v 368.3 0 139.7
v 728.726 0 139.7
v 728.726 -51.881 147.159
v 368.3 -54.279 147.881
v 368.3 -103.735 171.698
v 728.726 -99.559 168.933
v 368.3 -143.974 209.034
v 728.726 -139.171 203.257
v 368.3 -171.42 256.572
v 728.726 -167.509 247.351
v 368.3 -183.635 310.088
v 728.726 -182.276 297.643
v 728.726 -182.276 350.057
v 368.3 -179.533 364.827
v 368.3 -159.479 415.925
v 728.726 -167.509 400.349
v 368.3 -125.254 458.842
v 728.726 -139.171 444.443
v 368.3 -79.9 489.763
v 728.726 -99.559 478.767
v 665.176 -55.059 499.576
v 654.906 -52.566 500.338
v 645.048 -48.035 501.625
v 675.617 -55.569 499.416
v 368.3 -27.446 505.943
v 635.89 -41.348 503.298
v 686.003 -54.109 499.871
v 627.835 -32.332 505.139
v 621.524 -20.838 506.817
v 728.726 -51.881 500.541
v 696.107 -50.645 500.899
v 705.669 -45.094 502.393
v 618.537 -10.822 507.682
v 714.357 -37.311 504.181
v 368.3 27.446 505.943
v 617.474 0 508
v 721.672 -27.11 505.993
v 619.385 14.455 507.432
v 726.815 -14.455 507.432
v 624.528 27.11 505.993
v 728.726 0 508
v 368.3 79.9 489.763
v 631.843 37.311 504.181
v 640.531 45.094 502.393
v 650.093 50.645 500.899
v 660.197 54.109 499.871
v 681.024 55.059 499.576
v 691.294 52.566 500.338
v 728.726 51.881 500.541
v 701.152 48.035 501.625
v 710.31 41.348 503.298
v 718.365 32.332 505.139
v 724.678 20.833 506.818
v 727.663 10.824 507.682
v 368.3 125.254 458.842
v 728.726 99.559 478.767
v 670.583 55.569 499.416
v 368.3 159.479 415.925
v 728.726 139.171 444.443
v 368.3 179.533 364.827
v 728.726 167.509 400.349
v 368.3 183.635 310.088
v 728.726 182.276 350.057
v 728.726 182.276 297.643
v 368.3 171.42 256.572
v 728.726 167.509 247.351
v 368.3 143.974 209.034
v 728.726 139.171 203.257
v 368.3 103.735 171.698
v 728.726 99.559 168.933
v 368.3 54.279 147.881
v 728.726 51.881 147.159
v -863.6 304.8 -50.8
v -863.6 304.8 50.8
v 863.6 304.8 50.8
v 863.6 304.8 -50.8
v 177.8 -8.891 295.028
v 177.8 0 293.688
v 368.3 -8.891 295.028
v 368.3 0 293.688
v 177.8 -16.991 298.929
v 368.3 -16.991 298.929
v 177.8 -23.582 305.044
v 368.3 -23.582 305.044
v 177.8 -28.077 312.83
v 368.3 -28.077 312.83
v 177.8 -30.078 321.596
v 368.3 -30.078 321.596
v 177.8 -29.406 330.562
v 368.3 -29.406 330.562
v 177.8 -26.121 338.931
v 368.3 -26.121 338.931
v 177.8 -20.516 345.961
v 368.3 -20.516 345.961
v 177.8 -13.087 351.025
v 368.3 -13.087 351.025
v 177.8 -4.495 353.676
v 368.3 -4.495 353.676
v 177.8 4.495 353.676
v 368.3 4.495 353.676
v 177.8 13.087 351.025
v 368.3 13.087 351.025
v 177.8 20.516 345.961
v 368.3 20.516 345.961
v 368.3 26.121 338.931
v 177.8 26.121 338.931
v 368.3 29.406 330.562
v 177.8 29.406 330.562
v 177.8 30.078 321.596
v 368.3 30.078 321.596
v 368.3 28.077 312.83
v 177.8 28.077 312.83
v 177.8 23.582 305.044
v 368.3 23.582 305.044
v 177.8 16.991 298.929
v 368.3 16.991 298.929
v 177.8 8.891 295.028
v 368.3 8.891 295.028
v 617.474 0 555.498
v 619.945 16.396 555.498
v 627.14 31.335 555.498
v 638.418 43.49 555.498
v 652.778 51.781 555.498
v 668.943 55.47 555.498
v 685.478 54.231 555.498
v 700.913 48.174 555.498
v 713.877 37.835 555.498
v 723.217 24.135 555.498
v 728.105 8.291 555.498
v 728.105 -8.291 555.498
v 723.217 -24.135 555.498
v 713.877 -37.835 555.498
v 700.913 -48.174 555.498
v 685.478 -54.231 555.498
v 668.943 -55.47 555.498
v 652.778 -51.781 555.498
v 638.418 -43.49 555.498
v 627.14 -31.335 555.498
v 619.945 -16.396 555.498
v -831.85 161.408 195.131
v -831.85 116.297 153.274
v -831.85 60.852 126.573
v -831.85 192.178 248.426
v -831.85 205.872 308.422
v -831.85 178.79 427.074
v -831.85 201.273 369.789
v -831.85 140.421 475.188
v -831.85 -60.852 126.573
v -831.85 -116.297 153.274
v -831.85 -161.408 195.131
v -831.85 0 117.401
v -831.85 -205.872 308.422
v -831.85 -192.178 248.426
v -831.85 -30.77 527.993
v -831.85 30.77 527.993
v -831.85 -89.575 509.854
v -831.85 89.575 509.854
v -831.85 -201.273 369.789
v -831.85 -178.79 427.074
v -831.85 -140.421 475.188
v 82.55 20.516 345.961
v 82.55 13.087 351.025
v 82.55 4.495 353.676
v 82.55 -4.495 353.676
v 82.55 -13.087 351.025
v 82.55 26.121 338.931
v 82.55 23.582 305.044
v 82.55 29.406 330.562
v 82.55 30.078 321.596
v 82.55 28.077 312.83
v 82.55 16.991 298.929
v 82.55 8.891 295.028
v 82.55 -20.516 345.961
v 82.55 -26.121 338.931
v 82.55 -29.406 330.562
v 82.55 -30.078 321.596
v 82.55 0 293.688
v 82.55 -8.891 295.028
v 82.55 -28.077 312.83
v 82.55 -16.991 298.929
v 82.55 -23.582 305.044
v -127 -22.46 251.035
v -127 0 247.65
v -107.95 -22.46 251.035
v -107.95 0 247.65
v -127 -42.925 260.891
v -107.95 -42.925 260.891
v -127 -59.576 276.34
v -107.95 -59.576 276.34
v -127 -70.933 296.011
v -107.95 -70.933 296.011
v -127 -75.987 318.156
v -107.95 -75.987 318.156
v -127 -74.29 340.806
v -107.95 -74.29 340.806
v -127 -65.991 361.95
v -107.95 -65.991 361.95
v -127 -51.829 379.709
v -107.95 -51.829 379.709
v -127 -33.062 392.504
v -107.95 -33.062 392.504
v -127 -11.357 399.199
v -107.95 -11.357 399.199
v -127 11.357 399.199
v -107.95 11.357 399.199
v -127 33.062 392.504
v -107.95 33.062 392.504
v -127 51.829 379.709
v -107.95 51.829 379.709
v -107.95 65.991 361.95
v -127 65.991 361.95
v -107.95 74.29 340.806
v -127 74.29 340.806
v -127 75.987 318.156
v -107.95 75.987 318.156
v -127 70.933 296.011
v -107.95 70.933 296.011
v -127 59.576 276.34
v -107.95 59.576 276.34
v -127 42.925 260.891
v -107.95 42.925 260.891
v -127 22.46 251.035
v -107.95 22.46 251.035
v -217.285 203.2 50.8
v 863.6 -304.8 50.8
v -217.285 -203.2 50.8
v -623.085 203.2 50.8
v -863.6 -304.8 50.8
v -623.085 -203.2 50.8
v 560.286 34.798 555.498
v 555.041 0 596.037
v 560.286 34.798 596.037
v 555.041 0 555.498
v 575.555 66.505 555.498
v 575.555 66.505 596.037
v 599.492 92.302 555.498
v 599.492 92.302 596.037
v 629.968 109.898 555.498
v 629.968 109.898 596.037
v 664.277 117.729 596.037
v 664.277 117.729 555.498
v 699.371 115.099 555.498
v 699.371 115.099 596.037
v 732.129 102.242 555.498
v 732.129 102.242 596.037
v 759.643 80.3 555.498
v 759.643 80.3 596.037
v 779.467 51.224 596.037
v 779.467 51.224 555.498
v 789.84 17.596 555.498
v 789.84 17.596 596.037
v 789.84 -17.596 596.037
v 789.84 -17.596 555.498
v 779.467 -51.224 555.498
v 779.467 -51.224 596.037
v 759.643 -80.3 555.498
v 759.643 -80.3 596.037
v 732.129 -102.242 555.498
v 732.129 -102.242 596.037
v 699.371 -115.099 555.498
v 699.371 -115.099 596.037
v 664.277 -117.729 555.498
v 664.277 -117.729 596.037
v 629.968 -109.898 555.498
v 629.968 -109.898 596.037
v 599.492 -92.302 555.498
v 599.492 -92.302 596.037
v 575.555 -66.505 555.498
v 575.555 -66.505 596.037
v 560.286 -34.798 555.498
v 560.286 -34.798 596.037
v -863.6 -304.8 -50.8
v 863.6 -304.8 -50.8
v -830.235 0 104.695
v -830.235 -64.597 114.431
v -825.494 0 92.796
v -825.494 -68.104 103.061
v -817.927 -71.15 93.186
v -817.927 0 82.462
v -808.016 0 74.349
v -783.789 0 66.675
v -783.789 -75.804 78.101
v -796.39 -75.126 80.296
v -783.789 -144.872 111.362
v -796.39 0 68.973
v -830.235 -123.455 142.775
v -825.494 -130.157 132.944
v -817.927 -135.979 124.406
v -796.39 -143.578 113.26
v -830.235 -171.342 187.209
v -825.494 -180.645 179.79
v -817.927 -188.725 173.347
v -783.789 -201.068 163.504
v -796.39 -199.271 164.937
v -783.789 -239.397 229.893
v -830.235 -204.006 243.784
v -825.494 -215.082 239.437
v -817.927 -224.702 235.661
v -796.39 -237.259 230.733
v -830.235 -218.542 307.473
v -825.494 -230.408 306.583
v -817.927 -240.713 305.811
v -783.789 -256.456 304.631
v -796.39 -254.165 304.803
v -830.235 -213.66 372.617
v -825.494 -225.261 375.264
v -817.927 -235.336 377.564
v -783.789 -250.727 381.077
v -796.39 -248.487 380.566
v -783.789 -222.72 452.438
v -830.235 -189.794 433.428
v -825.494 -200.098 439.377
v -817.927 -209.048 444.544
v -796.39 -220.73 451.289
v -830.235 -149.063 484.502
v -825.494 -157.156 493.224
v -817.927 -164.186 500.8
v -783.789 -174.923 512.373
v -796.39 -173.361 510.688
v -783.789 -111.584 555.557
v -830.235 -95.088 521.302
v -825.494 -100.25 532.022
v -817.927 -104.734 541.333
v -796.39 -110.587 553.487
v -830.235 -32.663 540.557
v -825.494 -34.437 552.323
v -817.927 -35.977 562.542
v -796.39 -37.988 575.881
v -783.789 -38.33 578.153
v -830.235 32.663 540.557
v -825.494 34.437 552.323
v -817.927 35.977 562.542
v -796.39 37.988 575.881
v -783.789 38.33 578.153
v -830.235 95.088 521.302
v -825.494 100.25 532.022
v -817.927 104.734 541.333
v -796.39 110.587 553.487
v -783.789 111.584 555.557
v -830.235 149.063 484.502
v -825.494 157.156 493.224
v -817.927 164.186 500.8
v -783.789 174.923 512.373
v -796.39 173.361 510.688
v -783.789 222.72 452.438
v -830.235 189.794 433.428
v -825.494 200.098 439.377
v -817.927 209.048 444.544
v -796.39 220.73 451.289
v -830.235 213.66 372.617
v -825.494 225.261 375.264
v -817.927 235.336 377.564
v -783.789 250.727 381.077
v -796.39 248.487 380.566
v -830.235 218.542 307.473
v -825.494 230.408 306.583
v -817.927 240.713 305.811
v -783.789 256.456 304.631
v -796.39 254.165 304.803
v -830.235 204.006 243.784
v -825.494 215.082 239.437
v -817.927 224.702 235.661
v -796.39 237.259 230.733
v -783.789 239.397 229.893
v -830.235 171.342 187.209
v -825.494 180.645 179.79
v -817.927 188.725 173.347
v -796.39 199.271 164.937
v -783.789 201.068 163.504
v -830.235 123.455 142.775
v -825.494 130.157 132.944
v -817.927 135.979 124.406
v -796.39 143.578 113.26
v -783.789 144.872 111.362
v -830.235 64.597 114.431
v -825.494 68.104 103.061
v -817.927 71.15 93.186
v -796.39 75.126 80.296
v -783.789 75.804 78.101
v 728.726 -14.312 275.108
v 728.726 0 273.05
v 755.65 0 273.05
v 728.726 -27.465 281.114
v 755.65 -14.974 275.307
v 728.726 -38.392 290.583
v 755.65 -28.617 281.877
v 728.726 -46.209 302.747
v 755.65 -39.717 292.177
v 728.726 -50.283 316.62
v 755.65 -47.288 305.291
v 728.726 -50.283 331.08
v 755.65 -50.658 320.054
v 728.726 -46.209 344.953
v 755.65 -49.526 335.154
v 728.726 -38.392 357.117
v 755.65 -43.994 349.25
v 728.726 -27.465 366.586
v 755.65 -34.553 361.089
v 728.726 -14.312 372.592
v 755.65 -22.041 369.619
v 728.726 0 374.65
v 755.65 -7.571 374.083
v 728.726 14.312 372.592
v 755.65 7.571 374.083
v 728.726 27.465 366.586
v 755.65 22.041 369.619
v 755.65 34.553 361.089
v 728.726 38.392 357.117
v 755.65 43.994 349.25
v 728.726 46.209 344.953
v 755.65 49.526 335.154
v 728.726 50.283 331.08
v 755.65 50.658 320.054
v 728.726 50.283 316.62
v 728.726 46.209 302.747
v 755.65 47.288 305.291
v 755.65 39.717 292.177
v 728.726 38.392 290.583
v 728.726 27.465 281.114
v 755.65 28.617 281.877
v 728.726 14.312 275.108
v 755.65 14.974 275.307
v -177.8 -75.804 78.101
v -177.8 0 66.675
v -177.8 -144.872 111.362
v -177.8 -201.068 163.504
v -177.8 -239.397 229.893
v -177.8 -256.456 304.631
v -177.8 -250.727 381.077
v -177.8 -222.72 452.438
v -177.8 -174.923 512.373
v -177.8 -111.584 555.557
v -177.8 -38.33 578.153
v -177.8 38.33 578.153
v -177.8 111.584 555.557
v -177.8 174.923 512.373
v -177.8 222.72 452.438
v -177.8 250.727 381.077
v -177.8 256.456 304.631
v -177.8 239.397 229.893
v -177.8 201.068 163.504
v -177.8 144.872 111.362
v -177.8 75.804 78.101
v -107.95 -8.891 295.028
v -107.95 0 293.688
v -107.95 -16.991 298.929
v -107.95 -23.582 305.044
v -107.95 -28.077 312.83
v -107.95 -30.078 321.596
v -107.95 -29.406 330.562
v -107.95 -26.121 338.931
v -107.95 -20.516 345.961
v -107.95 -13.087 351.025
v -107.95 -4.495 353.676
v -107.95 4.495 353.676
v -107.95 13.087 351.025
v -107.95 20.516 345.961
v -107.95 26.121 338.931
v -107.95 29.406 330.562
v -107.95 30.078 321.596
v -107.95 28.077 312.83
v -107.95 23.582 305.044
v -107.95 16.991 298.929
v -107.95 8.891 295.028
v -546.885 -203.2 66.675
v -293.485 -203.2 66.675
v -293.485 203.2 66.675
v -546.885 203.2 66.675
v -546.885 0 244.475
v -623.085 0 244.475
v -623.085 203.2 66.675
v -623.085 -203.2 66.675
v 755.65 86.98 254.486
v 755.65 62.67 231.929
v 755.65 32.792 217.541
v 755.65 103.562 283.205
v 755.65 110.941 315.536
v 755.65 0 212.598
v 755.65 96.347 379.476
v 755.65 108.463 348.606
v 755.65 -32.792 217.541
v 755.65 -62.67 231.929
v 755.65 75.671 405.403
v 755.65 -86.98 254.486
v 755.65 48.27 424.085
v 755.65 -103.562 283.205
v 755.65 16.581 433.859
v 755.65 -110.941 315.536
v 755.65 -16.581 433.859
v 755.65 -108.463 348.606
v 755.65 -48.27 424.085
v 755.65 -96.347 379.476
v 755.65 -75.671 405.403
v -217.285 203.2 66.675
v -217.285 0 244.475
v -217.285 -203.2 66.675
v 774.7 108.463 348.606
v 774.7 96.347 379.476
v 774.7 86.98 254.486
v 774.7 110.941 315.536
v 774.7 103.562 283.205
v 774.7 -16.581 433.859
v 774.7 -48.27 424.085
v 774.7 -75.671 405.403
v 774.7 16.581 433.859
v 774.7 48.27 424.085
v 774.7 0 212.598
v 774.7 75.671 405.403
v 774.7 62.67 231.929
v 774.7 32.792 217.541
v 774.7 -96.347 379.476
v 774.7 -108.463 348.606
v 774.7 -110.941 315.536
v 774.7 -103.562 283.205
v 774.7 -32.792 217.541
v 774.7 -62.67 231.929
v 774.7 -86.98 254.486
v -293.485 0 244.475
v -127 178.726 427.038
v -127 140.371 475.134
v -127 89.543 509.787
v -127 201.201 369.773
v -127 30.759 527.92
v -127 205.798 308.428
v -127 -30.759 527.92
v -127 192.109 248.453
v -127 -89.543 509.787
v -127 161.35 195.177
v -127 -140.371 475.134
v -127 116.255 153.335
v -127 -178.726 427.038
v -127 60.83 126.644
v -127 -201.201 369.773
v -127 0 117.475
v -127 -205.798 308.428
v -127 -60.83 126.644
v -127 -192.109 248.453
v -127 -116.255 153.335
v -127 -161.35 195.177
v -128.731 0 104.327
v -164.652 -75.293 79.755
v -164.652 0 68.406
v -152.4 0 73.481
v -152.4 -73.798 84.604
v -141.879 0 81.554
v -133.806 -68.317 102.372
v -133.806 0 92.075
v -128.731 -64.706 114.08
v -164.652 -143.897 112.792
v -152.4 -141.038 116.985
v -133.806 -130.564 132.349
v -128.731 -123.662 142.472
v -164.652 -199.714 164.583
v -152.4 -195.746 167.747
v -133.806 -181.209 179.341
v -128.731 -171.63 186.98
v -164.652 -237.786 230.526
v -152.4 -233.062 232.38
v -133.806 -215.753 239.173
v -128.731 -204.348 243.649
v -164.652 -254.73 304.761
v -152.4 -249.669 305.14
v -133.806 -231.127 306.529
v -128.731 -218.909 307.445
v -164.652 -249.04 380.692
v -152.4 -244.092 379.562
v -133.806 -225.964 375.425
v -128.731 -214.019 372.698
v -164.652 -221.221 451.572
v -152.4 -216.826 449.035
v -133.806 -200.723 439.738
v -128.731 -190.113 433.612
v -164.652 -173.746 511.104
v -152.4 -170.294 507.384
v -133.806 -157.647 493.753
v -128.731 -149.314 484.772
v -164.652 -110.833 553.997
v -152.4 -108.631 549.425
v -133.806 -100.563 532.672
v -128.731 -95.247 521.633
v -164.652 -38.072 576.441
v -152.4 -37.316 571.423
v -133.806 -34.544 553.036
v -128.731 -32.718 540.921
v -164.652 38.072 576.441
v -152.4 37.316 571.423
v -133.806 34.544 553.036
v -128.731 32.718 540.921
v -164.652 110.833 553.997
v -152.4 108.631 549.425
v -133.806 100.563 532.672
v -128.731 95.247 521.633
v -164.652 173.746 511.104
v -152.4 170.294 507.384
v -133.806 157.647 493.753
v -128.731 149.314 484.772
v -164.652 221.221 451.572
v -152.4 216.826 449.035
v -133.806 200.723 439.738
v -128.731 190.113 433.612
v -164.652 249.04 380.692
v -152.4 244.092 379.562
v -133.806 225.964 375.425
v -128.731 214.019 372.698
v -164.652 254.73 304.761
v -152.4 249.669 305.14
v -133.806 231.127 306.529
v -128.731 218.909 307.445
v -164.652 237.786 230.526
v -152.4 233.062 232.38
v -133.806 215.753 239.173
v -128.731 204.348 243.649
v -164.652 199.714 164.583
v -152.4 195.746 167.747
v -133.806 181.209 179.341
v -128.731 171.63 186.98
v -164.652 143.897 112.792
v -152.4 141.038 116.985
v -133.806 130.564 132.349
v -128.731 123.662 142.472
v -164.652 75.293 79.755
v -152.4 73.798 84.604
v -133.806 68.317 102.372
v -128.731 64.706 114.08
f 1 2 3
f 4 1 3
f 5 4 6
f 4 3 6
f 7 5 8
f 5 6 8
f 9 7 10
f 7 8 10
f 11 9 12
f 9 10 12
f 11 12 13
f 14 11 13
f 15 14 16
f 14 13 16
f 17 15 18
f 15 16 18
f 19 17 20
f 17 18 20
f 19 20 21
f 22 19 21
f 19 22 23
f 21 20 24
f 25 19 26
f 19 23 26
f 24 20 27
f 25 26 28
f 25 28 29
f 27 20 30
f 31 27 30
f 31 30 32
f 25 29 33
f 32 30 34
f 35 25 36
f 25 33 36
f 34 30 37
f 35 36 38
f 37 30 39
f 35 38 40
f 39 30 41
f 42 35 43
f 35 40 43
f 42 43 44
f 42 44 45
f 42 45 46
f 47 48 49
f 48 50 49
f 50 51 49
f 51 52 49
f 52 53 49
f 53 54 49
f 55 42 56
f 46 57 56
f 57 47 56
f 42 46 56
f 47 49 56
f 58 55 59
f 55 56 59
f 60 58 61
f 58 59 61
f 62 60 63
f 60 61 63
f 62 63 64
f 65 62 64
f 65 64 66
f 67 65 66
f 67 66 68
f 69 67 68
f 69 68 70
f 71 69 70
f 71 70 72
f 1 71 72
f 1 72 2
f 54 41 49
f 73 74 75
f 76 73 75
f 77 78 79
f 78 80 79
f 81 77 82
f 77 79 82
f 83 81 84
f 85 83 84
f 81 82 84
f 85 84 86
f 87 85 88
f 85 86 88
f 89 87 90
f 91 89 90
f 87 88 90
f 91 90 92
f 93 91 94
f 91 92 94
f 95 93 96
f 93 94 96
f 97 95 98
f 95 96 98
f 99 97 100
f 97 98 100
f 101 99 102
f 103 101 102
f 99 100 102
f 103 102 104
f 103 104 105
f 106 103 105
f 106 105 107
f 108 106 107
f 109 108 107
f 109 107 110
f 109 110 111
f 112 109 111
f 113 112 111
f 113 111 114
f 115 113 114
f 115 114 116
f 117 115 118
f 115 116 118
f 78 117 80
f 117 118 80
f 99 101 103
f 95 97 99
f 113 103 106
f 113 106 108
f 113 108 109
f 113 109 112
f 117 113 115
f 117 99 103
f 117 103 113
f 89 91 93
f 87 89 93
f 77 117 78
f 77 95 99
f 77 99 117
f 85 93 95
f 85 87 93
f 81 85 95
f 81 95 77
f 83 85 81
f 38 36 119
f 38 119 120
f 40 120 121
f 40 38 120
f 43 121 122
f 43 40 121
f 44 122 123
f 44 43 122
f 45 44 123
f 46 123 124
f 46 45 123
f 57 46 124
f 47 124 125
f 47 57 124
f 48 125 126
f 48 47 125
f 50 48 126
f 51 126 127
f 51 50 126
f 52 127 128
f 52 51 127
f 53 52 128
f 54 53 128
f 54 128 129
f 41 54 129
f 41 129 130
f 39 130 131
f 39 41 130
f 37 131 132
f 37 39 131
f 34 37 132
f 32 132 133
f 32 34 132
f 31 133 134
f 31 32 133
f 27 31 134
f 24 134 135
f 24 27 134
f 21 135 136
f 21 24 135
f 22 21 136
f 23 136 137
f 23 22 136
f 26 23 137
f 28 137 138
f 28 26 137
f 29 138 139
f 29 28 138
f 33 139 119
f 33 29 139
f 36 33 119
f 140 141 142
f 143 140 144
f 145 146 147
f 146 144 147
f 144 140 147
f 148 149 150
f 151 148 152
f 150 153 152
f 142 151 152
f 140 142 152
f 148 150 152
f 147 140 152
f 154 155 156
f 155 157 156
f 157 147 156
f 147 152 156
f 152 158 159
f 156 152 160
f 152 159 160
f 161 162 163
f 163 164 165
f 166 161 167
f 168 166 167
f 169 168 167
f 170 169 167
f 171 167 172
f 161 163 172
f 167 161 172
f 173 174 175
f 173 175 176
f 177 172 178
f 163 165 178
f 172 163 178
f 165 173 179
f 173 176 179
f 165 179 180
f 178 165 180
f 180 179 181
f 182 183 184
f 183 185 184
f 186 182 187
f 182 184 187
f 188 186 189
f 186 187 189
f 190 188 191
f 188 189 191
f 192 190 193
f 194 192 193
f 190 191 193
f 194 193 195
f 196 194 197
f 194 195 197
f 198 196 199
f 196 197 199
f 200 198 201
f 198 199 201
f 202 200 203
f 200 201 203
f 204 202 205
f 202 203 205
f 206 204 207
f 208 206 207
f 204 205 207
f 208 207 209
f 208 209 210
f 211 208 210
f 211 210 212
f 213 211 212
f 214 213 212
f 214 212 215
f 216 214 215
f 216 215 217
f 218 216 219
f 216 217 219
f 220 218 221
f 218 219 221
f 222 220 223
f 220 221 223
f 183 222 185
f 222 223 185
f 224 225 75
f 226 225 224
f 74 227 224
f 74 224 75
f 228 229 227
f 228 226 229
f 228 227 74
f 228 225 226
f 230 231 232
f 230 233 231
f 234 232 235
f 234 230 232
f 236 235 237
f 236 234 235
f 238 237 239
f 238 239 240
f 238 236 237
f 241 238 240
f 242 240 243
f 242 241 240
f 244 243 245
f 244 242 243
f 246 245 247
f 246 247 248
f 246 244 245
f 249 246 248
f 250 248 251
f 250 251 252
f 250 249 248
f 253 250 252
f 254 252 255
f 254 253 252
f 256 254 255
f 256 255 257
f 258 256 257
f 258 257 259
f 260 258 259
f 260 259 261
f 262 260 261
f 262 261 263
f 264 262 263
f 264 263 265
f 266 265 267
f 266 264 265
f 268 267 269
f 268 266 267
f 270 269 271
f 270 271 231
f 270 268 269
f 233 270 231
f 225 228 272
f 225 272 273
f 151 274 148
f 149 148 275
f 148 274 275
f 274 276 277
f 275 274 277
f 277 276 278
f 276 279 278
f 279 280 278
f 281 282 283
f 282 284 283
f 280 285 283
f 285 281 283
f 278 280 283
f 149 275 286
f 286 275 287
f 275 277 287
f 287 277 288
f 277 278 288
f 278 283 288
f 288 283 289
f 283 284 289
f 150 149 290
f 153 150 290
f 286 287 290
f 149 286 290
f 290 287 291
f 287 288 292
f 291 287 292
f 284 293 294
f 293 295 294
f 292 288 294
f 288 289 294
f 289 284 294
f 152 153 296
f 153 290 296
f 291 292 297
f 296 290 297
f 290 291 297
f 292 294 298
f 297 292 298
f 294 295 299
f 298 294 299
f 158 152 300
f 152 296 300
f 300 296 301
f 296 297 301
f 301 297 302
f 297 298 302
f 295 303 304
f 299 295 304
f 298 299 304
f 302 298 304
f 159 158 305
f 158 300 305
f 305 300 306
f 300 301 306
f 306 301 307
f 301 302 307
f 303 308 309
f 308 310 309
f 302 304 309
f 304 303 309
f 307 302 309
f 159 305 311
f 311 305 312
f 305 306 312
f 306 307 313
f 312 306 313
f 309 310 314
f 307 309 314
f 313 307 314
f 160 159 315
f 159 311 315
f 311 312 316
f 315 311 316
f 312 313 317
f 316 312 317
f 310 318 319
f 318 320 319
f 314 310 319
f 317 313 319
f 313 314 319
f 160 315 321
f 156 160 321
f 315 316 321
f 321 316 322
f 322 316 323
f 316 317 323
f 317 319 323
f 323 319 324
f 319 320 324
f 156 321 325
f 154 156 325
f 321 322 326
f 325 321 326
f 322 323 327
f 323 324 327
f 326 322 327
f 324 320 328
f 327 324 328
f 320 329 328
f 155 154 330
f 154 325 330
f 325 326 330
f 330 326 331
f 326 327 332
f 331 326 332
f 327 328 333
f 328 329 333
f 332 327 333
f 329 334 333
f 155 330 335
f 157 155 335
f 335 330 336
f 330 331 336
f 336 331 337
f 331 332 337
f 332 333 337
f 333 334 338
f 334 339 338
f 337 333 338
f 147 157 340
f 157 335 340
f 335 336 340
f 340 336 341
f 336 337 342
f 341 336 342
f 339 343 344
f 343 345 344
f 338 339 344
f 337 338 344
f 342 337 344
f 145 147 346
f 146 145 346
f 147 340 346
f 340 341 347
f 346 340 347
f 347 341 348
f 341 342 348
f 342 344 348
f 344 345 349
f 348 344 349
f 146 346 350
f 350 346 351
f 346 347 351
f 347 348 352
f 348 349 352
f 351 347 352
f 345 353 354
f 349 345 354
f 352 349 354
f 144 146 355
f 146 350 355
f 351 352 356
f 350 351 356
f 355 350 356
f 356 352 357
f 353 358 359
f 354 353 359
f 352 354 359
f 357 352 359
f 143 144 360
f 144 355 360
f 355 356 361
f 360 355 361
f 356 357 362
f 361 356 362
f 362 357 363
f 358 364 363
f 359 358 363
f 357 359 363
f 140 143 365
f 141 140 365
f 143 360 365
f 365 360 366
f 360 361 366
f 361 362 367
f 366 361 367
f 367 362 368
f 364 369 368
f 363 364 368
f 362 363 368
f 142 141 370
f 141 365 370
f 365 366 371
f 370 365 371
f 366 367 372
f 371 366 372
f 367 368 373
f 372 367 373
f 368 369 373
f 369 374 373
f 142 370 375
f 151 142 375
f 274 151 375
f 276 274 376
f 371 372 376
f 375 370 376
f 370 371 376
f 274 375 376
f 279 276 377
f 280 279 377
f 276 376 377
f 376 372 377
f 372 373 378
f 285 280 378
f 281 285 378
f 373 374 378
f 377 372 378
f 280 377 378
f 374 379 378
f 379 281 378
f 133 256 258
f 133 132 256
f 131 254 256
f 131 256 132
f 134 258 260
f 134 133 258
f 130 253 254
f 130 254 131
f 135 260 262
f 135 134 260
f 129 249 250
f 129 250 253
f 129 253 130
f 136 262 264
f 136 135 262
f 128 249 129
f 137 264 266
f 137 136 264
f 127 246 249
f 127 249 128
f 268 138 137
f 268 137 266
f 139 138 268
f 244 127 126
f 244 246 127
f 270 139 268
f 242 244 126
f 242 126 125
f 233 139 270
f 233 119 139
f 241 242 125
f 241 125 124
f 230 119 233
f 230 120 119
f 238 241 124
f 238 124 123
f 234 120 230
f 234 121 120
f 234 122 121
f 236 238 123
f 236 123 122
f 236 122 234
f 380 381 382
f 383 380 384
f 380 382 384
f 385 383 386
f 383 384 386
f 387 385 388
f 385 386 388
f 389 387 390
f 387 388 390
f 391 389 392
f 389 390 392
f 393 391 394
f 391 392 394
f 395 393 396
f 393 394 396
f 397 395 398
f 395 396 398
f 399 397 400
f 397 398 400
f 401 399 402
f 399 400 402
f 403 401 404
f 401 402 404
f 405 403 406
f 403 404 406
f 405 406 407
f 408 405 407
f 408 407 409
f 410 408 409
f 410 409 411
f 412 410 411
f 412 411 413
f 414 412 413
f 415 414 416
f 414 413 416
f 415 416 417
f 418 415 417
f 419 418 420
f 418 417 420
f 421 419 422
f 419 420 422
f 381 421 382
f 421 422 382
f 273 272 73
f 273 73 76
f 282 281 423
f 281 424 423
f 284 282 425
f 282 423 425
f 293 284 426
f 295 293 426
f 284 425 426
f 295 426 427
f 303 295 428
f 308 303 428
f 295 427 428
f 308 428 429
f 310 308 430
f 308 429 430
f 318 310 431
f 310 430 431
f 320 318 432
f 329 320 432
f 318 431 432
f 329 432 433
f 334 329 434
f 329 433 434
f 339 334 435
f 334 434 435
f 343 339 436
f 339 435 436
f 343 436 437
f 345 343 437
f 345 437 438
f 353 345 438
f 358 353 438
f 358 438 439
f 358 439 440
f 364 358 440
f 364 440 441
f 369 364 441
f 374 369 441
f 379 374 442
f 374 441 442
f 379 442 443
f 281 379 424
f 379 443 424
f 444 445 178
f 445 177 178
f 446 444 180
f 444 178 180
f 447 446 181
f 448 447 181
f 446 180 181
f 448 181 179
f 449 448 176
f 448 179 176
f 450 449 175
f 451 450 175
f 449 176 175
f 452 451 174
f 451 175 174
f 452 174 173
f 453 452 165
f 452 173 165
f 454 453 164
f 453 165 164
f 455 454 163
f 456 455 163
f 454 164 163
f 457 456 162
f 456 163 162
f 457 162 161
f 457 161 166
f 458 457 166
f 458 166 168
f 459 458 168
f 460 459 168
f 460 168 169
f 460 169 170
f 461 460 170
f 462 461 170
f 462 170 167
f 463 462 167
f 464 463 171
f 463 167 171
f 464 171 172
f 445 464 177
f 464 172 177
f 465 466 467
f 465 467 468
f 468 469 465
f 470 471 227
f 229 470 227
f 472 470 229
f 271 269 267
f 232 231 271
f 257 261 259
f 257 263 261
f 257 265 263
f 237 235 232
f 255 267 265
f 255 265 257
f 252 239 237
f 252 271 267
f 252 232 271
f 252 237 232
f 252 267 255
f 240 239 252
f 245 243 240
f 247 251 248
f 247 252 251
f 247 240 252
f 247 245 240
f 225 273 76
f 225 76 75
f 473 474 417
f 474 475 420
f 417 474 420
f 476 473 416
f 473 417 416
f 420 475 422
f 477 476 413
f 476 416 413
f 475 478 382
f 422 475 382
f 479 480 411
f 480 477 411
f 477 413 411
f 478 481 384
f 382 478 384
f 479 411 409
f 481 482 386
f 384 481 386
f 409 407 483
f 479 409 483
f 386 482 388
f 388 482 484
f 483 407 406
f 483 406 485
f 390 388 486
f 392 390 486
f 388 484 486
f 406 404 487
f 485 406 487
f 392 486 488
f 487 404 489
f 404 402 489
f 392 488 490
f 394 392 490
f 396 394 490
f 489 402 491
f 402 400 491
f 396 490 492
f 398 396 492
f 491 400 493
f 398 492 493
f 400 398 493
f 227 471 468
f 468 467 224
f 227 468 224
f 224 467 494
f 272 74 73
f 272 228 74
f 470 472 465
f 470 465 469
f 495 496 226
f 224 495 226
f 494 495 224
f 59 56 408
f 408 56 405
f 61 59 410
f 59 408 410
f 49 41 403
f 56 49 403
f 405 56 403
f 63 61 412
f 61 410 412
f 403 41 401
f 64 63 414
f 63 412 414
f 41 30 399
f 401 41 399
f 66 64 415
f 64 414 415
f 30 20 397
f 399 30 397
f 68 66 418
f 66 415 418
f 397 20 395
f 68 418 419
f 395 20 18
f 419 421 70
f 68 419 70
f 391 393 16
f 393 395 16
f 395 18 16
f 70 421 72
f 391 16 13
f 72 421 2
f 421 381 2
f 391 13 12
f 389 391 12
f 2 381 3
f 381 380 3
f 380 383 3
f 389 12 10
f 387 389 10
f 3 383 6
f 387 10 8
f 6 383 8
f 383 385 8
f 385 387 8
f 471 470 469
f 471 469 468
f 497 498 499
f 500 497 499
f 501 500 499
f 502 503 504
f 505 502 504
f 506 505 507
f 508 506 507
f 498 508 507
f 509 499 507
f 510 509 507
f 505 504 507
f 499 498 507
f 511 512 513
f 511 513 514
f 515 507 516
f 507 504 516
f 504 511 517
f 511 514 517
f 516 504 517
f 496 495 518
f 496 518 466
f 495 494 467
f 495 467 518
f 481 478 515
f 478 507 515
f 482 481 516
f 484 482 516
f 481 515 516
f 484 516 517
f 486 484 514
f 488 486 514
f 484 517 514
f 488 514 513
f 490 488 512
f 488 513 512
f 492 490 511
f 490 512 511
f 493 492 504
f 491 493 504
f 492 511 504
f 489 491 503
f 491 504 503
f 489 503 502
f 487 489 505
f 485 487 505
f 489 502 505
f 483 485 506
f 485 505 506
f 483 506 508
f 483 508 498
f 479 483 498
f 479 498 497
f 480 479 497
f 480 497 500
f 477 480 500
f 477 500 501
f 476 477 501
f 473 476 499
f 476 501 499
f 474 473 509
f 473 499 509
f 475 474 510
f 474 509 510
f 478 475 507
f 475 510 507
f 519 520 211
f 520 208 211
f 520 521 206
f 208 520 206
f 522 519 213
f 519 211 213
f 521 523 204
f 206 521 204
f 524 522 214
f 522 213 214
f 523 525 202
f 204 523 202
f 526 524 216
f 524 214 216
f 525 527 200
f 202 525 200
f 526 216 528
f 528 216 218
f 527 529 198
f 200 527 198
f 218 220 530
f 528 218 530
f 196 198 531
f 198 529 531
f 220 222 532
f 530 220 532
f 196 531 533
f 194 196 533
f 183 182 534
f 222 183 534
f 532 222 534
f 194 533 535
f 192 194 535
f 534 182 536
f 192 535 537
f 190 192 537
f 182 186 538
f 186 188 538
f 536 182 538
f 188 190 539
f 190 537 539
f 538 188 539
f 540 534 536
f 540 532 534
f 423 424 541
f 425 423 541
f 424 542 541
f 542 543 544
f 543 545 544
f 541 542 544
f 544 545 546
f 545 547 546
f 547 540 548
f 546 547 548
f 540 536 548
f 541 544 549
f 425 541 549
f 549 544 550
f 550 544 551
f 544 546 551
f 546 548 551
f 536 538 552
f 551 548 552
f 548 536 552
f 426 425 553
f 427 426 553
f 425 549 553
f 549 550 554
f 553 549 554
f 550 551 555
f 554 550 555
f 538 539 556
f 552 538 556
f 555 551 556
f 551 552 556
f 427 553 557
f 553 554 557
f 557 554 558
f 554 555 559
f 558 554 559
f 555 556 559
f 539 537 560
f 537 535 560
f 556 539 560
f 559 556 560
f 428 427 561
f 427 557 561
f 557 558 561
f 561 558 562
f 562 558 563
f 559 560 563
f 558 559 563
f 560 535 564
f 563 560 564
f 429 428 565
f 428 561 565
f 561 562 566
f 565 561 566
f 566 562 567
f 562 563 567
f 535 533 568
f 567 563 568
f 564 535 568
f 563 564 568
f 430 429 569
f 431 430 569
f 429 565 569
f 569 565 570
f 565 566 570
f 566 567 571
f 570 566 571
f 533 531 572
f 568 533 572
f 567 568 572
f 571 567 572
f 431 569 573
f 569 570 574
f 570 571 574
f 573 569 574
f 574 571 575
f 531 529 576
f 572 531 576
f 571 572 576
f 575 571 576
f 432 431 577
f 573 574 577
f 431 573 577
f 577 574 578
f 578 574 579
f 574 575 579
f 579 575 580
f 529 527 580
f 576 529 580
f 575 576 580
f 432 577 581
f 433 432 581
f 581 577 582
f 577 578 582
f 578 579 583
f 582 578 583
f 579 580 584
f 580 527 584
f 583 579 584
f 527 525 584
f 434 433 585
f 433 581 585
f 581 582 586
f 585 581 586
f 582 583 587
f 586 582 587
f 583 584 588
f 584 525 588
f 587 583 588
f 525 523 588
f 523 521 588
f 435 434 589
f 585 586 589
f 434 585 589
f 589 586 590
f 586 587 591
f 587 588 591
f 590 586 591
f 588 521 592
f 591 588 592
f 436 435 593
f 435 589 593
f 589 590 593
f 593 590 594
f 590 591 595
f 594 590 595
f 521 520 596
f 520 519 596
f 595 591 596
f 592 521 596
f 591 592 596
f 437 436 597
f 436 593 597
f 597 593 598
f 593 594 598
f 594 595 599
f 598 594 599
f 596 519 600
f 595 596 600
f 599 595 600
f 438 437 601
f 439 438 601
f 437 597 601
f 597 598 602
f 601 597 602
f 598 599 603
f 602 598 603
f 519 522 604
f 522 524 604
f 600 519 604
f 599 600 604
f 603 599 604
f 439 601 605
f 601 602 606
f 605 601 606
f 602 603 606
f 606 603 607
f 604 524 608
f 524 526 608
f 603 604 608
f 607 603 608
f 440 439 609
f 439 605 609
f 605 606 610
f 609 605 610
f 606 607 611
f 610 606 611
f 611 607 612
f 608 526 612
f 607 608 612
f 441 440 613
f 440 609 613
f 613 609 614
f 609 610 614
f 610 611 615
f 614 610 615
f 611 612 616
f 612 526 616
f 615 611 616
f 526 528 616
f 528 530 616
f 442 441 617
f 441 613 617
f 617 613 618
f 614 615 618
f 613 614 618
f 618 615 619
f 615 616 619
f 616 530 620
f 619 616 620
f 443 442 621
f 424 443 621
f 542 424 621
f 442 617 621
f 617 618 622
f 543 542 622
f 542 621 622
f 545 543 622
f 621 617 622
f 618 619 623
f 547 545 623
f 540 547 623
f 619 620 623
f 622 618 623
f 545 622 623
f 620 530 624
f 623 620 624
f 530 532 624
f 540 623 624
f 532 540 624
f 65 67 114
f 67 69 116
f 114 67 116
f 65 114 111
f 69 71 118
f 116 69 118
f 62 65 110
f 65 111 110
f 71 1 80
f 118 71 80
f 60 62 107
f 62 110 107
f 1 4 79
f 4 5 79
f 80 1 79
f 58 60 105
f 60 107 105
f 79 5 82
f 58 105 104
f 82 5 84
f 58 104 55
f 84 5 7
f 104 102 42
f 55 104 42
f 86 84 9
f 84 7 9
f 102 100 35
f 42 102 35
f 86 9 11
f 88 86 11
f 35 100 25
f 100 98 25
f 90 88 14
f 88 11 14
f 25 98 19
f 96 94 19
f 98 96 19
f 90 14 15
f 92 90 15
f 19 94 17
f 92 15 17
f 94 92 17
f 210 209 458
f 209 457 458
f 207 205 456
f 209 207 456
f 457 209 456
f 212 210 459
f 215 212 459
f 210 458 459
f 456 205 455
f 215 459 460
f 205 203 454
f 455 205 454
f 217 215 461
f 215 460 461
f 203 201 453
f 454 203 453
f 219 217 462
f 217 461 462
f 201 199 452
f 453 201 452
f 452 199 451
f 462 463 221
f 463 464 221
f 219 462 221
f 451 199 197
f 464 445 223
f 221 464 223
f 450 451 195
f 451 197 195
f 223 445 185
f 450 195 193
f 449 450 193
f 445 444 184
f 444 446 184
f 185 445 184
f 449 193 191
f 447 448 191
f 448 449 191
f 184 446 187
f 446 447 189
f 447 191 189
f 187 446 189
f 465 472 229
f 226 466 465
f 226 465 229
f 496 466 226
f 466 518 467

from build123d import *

# Parameters (mm, degrees)
F0_W     = 190.5
F0_H     = 30.1625
F2_DEPTH = 203.2
F4_DEPTH = 76.2
F6_DEPTH = 76.2
F7_DEPTH = 304.8
F0_W_2   = 26.924
F0_H_2   = 50.8
F0_W_3   = 55.626
F0_H_3   = 47.498
F0_H_4   = 184.15


with BuildPart() as f1:
    # F0 (on Front) → F1 (revolve)
    with BuildSketch(Plane.XZ):
        with BuildLine():
            ThreePointArc((-831.85, 117.4010858536), (-817.9268261091, 82.4620003458), (-783.7893820427, 66.675))
            Line((-783.7893820427, 66.675), (-623.0849027634, 66.675))
            Line((-623.0849027634, 66.675), (-234.2933673859, 66.675))
            Line((-234.2933673859, 66.675), (-234.2933673859, 323.85))
            Line((-234.2933673859, 323.85), (-831.85, 323.85))
            Line((-831.85, 323.85), (-831.85, 117.4010858536))
        make_face()
        with BuildLine():
            Line((-234.2933673859, 323.85), (-234.2933673859, 66.675))
            Line((-234.2933673859, 66.675), (-217.2845751047, 66.675))
            Line((-217.2845751047, 66.675), (-177.8, 66.675))
            ThreePointArc((-177.8, 66.675), (-141.8789755157, 81.5539755157), (-127, 117.475))
            Line((-127, 117.475), (-127, 247.65))
            Line((-127, 247.65), (-127, 323.85))
            Line((-127, 323.85), (-234.2933673859, 323.85))
        make_face()
        Polygon((-107.95, 323.85), (-127, 323.85), (-127, 247.65), (-107.95, 247.65), (-107.95, 293.6875), align=None)
        with Locations((-12.7, 308.76875)):
            Rectangle(F0_W, F0_H)
    revolve(axis=Axis((-374.65, 0, 323.85), (-1, 0, 0)))


with BuildPart() as f2:
    # F0 (on Front) → F2 (new body, symmetric)
    with BuildSketch(Plane.XZ):
        Polygon((-623.0849027634, 66.675), (-623.0849027634, 50.8), (-533.4, 50.8), (-217.2845751047, 50.8), (-217.2845751047, 66.675), (-234.2933673859, 66.675), align=None)
    extrude(amount=F2_DEPTH, both=True)

    # F3 (on face) → F4 (join)
    with BuildSketch(Plane(origin=(-623.0849027634, 0, 0), x_dir=(0, -1, 0), z_dir=(-1, 0, 0))):
        Polygon((0, 244.475), (0, 66.675), (203.2, 66.675), align=None)
        Polygon((-203.2, 66.675), (0, 66.675), (0, 244.475), align=None)
    extrude(amount=-F4_DEPTH)

    # F5 (on face) → F6 (join)
    with BuildSketch(Plane.YZ.offset(-217.2845751047)):
        Polygon((-203.2, 66.675), (0, 66.675), (0, 244.475), align=None)
        Polygon((0, 244.475), (0, 66.675), (203.2, 66.675), align=None)
    extrude(amount=-F6_DEPTH)

    # F0 (on Front) → F7 (join, symmetric)
    with BuildSketch(Plane.XZ):
        Polygon((-863.6, 50.8), (-863.6, -50.8), (863.6, -50.8), (863.6, 50.8), (705.2845358849, 50.8), (588.1003141403, 50.8), (455.1412463188, 50.8), (368.3, 50.8), (-127, 50.8), (-217.2845751047, 50.8), (-533.4, 50.8), (-623.0849027634, 50.8), (-736.6, 50.8), (-831.85, 50.8), align=None)
    extrude(amount=F7_DEPTH, both=True)


with BuildPart() as f8:
    # F0 (on Front) → F8 (revolve)
    with BuildSketch(Plane.XZ):
        with Locations((273.05, 308.76875)):
            Rectangle(F0_W, F0_H)
        Polygon((615.1428222656, 139.7), (689.5097494125, 139.7), (728.726, 139.7), (728.726, 273.05), (728.726, 323.85), (673.1, 323.85), (617.474, 323.85), (368.3, 323.85), (368.3, 293.6875), (368.3, 139.7), (394.2955732346, 139.7), (455.1412463188, 139.7), align=None)
        with Locations((742.188, 298.45)):
            Rectangle(F0_W_2, F0_H_2)
        Polygon((755.65, 323.85), (755.65, 273.05), (755.65, 212.598), (774.7, 212.598), (774.7, 323.85), align=None)
    revolve(axis=Axis((476.25, 0, 323.85), (-1, 0, 0)))

    # F0 (on Front) → F9 (revolve)
    with BuildSketch(Plane.XZ):
        Polygon((617.474, 555.498), (673.1, 555.498), (673.1, 596.0371494293), (555.0411343575, 596.0371494293), (555.0411343575, 555.498), align=None)
        with Locations((645.287, 531.749)):
            Rectangle(F0_W_3, F0_H_3)
        with Locations((645.287, 415.925)):
            Rectangle(F0_W_3, F0_H_4)
    revolve(axis=Axis((673.1, 0, 439.674), (0, 0, -1)))


solid = Compound([f1.part, f2.part, f8.part])
